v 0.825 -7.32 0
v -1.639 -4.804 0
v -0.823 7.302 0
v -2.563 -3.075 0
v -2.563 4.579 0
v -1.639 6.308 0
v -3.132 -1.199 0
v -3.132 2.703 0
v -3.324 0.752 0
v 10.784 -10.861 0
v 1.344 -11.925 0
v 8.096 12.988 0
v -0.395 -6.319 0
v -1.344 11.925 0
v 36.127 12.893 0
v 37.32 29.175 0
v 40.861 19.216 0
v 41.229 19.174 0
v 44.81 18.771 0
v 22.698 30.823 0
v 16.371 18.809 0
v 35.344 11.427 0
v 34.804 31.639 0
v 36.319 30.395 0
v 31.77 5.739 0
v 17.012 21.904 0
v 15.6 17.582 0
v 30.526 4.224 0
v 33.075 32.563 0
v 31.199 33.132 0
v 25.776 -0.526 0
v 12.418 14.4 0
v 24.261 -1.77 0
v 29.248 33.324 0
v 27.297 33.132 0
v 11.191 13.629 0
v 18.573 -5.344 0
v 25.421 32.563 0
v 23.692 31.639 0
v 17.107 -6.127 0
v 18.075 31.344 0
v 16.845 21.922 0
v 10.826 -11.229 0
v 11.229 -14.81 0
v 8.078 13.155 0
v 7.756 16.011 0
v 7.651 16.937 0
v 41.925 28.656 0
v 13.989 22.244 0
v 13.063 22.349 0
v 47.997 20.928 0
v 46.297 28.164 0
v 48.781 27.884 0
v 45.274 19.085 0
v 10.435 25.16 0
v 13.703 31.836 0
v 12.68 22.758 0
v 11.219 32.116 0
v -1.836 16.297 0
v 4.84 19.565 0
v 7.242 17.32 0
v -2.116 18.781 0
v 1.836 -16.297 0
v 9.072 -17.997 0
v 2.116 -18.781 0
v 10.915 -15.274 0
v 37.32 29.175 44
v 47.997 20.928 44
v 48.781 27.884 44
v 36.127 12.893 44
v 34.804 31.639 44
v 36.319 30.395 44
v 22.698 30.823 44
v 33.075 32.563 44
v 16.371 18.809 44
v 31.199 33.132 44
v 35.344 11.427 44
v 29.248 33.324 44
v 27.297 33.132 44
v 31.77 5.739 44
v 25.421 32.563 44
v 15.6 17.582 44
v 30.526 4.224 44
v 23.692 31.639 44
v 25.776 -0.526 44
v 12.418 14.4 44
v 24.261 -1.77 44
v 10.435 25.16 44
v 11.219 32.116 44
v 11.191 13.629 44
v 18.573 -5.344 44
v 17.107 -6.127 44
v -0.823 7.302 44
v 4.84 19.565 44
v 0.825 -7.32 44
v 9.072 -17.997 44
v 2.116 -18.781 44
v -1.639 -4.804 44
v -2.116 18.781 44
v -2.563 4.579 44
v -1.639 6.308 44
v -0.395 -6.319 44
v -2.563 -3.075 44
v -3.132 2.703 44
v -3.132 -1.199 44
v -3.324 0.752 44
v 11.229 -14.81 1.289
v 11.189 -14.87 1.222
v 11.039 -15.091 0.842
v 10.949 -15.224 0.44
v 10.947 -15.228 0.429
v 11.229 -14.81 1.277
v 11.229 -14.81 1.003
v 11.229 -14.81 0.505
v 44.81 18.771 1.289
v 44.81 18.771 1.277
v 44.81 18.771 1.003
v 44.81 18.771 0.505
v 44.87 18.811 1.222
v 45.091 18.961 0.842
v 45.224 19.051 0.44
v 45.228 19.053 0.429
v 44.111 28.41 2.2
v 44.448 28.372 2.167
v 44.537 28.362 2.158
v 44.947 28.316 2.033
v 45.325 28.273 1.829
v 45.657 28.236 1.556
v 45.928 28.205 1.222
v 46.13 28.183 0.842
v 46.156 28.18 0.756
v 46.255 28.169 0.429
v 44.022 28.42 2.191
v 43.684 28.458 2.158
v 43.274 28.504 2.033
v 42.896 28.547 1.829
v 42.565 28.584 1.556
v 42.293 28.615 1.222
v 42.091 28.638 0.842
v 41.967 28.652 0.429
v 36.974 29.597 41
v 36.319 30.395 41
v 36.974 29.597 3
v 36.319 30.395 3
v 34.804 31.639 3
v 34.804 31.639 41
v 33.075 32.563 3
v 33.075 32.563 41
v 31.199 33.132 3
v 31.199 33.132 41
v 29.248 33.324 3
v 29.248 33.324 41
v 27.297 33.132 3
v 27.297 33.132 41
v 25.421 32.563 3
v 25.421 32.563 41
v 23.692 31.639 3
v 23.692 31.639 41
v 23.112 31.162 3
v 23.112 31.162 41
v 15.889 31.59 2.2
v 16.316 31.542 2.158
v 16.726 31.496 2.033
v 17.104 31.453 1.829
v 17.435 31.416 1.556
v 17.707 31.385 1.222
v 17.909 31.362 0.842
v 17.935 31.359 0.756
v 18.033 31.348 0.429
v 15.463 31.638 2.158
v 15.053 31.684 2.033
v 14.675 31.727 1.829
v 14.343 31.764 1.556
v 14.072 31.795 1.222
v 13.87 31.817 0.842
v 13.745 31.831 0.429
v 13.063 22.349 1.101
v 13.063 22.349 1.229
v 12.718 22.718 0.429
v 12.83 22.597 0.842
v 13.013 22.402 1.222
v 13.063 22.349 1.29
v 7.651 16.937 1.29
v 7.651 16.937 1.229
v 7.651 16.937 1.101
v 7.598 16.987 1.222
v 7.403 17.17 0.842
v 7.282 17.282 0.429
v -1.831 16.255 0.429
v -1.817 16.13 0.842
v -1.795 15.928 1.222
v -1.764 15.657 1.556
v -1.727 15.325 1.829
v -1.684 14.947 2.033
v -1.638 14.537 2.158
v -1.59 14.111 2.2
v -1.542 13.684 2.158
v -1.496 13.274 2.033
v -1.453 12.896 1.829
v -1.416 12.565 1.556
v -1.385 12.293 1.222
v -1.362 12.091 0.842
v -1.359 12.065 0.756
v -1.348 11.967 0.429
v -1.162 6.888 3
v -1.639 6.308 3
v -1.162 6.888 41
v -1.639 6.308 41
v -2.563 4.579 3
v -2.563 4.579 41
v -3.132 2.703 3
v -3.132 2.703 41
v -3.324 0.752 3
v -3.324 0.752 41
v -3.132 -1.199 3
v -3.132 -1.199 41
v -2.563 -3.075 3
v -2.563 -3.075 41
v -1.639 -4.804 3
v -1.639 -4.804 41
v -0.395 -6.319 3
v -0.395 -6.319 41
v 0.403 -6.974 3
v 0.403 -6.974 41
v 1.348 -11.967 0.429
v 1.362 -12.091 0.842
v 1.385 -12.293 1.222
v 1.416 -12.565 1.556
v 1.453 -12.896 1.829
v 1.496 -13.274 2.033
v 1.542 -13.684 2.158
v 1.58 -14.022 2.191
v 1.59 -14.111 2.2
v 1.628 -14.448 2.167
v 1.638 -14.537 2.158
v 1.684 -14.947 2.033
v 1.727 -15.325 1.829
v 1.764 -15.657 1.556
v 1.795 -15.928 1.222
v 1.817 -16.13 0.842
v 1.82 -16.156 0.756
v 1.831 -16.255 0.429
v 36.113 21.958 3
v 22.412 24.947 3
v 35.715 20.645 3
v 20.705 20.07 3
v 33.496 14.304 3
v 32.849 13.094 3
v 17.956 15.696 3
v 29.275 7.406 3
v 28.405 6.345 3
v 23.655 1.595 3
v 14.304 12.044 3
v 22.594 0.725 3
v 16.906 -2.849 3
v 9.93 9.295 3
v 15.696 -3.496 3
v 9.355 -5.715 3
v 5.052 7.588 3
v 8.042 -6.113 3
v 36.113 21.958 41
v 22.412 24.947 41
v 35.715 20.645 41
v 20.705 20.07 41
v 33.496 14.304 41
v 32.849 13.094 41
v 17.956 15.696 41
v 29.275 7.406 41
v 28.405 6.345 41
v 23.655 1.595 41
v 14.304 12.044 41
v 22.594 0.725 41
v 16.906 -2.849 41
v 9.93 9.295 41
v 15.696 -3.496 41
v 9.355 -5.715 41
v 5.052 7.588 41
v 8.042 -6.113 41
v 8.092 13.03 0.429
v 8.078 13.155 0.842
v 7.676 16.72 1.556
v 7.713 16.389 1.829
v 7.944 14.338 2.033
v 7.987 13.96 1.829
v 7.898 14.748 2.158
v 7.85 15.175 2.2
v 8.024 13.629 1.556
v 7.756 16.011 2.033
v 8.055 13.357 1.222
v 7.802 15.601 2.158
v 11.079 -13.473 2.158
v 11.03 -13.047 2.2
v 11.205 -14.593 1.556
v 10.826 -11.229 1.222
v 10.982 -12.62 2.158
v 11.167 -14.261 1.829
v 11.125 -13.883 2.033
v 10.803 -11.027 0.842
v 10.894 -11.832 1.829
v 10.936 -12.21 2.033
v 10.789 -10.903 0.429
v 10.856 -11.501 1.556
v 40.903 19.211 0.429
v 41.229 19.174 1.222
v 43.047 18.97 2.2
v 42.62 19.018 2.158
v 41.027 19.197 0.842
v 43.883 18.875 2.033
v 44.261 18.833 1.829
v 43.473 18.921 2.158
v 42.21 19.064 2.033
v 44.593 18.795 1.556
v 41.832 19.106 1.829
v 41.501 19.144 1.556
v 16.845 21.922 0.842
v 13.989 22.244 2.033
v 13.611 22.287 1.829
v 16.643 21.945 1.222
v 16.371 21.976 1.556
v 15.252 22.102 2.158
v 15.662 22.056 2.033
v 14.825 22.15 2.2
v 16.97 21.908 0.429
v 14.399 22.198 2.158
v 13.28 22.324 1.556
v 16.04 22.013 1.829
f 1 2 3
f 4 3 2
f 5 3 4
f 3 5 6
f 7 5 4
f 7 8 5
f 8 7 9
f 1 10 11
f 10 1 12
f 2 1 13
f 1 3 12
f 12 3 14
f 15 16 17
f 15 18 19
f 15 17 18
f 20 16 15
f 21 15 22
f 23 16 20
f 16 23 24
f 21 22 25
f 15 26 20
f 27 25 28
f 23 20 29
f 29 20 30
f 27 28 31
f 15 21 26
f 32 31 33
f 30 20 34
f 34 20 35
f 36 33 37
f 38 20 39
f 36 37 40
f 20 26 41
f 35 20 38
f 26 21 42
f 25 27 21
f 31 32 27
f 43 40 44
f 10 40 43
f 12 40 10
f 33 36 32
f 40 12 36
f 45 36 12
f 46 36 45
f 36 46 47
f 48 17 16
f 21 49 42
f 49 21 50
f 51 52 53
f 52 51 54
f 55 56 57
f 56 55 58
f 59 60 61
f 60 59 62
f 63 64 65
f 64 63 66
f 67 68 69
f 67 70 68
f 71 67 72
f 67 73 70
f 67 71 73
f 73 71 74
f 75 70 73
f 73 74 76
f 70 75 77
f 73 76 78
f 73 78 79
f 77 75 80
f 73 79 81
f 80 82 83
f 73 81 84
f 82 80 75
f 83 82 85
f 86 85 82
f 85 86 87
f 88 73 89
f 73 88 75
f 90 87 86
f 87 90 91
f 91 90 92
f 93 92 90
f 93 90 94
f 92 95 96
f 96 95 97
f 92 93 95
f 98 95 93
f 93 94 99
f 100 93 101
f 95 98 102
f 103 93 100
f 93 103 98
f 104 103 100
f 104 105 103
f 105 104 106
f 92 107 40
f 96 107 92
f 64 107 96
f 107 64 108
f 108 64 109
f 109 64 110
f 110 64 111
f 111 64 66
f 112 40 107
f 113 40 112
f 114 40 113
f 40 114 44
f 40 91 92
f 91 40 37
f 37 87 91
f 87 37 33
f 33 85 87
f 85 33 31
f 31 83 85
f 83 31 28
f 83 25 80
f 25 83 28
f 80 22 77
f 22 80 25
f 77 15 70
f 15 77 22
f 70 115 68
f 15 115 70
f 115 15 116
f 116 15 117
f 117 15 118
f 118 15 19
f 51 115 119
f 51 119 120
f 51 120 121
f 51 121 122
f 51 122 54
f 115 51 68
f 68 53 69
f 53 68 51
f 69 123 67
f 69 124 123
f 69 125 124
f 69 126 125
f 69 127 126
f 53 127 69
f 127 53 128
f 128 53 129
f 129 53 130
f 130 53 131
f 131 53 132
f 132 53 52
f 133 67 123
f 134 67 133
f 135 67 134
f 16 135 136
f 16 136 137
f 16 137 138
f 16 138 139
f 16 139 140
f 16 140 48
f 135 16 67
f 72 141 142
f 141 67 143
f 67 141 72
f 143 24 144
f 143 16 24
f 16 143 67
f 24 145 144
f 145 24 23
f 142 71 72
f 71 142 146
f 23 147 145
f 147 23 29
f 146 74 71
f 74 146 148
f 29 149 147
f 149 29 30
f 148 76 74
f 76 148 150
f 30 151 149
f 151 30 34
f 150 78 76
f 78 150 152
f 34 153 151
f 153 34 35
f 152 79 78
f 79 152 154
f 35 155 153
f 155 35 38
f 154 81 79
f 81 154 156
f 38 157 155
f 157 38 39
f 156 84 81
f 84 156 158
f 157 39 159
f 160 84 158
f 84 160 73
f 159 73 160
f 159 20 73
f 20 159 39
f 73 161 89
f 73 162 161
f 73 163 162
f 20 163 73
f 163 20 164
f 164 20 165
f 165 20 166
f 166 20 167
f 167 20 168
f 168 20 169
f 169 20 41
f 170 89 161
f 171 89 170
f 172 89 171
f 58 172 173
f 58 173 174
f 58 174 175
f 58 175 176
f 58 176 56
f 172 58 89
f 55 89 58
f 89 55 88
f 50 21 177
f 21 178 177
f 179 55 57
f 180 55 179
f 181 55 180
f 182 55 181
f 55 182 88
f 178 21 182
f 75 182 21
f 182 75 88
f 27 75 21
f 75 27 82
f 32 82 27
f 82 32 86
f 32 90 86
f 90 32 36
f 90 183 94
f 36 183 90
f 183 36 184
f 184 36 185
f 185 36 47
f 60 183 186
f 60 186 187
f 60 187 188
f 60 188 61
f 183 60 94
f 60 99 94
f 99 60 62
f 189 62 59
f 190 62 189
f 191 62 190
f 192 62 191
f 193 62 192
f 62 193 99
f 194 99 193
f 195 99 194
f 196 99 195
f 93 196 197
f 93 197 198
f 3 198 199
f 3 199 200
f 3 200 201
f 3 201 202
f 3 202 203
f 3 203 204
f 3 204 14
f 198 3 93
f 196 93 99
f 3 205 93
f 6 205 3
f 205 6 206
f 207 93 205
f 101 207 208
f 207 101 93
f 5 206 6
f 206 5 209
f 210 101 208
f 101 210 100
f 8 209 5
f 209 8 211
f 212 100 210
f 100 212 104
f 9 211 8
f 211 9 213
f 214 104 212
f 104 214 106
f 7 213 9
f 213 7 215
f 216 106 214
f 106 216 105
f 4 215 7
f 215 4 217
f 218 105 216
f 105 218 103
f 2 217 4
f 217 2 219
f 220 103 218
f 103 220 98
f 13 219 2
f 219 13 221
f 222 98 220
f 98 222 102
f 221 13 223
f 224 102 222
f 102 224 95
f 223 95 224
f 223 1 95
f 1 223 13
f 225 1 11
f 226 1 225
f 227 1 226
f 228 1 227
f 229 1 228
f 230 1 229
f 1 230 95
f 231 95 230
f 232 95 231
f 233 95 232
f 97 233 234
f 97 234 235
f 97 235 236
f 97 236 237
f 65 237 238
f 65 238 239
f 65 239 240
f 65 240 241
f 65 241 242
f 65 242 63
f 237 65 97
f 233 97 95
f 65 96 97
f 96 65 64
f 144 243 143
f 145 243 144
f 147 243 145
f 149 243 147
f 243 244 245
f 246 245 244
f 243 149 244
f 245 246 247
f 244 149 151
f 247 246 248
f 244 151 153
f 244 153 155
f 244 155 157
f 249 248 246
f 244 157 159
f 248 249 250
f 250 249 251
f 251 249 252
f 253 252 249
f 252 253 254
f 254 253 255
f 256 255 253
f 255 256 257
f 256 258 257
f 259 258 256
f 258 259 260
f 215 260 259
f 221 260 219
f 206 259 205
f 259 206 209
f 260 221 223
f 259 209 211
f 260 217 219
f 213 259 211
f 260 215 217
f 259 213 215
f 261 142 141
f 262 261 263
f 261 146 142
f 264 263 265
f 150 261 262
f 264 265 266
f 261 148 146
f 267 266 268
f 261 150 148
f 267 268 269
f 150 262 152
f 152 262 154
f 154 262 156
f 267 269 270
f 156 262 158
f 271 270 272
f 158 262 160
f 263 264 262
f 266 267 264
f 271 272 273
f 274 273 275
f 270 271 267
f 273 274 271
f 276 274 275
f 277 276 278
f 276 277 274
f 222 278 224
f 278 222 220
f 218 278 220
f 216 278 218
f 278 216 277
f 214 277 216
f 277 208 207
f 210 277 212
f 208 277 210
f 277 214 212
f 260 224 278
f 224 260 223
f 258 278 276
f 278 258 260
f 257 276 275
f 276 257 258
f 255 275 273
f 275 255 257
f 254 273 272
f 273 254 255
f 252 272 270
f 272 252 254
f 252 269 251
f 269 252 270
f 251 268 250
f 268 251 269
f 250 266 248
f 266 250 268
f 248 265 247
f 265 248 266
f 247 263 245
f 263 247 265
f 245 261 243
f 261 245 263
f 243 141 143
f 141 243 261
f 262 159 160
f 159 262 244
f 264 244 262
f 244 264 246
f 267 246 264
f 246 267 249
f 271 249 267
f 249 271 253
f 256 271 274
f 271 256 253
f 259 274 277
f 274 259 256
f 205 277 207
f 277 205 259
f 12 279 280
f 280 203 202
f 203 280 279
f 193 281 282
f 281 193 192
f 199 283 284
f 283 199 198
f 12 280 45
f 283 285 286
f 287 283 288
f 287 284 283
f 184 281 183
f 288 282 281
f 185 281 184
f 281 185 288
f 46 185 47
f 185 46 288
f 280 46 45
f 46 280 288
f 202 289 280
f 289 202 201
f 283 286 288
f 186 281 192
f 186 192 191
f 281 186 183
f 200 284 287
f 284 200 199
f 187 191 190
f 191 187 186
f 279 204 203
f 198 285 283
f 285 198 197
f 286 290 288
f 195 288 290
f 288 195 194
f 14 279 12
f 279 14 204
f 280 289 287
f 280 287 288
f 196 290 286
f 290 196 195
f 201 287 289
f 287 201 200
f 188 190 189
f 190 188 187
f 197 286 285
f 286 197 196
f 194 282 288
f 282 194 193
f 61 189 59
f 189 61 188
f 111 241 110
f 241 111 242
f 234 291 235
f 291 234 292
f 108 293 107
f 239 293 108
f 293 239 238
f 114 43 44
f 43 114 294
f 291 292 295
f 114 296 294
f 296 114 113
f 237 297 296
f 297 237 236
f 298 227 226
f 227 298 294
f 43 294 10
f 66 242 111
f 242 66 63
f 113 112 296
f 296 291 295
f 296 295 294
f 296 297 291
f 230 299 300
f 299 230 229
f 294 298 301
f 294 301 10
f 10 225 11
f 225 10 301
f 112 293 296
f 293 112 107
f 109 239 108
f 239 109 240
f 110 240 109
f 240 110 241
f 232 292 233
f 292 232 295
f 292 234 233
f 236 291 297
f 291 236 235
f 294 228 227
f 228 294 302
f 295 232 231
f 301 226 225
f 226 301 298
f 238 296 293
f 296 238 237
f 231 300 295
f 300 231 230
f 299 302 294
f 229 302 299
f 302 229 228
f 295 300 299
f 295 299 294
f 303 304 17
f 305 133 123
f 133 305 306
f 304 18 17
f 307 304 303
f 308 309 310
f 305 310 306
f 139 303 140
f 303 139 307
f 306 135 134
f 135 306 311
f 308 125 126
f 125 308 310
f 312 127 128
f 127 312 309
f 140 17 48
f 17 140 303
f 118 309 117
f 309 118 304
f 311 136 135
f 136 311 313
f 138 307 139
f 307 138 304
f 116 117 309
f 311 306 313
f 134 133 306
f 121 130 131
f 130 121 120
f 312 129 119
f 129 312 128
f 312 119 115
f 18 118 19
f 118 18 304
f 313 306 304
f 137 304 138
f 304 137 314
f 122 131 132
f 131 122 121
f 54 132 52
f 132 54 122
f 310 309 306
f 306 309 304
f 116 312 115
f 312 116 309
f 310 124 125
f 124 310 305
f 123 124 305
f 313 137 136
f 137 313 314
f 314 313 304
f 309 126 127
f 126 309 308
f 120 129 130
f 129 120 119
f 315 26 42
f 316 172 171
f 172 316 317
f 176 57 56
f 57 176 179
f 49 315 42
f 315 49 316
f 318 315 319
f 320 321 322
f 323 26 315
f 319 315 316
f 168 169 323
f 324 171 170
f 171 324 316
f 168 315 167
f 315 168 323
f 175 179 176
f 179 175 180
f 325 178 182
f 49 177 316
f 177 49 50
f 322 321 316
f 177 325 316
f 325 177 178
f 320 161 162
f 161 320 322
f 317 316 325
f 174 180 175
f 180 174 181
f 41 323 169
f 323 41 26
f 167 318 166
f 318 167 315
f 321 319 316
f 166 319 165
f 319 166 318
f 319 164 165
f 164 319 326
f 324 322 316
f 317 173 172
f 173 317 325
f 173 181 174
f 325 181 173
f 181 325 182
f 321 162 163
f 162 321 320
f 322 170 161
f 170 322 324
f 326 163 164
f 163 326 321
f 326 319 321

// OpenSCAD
$fn = 32;

// ----------------------------------------------------------------------
// Air duct: 20 mm duct, 3 mm wall, 44 mm across
// ----------------------------------------------------------------------

// --- parameters (mm) ---
duct_r = 10;              // duct core radius
duct_d = 20;              // duct core diameter
wall = 3;                 // duct wall thickness
height = 44;              // duct width (extrusion height)
port_r = 18.9;            // port flange half width
port_d = 37.8;            // port flange width
port_t = 7;               // port flange thickness
bolt_d = 4.4;             // port bolt holes
bolt_offset = 14.2;       // bolt hole offset from the port axis

difference() {
  /* outer hull chain: tube with a flat flange plate at every port */
  linear_extrude(height = 44) {
    hull() {
      polygon([[2.116, -18.781], [-2.116, 18.781], [4.84, 19.565], [9.072, -17.997]]);
      translate([9.937, 1.12]) circle(r = 10);
    }
    hull() {
      translate([9.937, 1.12]) circle(r = 10);
      translate([6.676, 0.752]) circle(r = 10);
    }
    hull() {
      translate([6.676, 0.752]) circle(r = 10);
      translate([13.017, 2.971]) circle(r = 10);
    }
    hull() {
      translate([13.017, 2.971]) circle(r = 10);
      translate([18.705, 6.545]) circle(r = 10);
    }
    hull() {
      translate([18.705, 6.545]) circle(r = 10);
      translate([23.455, 11.295]) circle(r = 10);
    }
    hull() {
      translate([23.455, 11.295]) circle(r = 10);
      translate([27.029, 16.983]) circle(r = 10);
    }
    hull() {
      translate([27.029, 16.983]) circle(r = 10);
      translate([29.248, 23.324]) circle(r = 10);
    }
    hull() {
      translate([29.248, 23.324]) circle(r = 10);
      translate([28.88, 20.063]) circle(r = 10);
    }
    hull() {
      translate([28.88, 20.063]) circle(r = 10);
      polygon([[11.219, 32.116], [48.781, 27.884], [47.997, 20.928], [10.435, 25.16]]);
    }
  }
  /* air passage: the same chain inset by the wall, 5 mm proud of the ports */
  translate([0, 0, 3]) linear_extrude(height = 38) {
    hull() {
      translate([-4.969, -0.56]) circle(r = 7);
      translate([6.676, 0.752]) circle(r = 7);
    }
    hull() {
      translate([6.676, 0.752]) circle(r = 7);
      translate([13.017, 2.971]) circle(r = 7);
    }
    hull() {
      translate([13.017, 2.971]) circle(r = 7);
      translate([18.705, 6.545]) circle(r = 7);
    }
    hull() {
      translate([18.705, 6.545]) circle(r = 7);
      translate([23.455, 11.295]) circle(r = 7);
    }
    hull() {
      translate([23.455, 11.295]) circle(r = 7);
      translate([27.029, 16.983]) circle(r = 7);
    }
    hull() {
      translate([27.029, 16.983]) circle(r = 7);
      translate([29.248, 23.324]) circle(r = 7);
    }
    hull() {
      translate([29.248, 23.324]) circle(r = 7);
      translate([30.56, 34.969]) circle(r = 7);
    }
  }
  translate([0, 0]) rotate([0, 0, -83.57]) translate([-14.2, -2.5]) rotate([-90, 0, 0]) cylinder(h = 12, d = 4.4);
  translate([0, 0]) rotate([0, 0, -83.57]) translate([14.2, -2.5]) rotate([-90, 0, 0]) cylinder(h = 12, d = 4.4);
  translate([30, 30]) rotate([0, 0, 173.57]) translate([-14.2, -2.5]) rotate([-90, 0, 0]) cylinder(h = 12, d = 4.4);
  translate([30, 30]) rotate([0, 0, 173.57]) translate([14.2, -2.5]) rotate([-90, 0, 0]) cylinder(h = 12, d = 4.4);
}
